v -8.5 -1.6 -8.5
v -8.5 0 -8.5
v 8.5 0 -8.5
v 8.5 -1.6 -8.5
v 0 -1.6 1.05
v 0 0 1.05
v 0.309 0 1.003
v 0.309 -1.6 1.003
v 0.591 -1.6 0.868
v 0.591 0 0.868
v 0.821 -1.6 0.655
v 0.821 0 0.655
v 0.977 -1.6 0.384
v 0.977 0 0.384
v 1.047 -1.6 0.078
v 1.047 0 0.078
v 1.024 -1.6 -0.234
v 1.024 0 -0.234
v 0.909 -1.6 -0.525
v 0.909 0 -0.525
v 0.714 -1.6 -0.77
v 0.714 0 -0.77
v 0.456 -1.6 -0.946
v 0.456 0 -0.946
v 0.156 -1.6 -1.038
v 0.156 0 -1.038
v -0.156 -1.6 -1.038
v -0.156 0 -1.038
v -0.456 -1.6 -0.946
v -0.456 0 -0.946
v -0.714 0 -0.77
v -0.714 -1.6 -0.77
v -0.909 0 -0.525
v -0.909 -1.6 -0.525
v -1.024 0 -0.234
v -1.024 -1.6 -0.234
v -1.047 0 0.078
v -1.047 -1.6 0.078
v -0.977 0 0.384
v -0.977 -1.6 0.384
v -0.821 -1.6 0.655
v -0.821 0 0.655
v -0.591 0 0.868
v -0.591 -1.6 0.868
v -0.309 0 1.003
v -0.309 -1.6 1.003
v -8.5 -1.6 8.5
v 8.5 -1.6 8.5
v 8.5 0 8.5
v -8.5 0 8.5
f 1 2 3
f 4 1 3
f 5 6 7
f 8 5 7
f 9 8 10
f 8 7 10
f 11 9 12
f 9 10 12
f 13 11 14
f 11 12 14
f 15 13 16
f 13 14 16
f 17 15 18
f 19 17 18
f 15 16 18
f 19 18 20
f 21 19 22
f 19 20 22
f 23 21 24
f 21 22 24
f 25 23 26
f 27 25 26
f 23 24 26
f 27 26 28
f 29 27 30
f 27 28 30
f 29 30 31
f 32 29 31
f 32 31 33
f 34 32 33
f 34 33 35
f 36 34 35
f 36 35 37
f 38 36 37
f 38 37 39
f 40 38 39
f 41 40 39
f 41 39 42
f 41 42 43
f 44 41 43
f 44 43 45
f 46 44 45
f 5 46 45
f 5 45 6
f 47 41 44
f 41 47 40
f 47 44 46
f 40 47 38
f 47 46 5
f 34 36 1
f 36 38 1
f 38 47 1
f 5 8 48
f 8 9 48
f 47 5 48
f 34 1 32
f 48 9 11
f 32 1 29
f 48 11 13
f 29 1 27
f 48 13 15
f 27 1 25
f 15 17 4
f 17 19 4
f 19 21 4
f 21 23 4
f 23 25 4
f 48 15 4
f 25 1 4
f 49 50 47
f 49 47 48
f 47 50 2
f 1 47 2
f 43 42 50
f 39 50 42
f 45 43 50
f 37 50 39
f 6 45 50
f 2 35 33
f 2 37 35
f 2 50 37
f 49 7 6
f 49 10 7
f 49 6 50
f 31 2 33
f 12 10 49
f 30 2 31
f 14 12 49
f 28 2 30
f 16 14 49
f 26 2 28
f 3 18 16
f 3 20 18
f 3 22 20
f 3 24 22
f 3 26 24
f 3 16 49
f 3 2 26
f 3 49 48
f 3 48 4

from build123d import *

# Parameters (mm, degrees)
SKETCH_7_W          = 17
SKETCH_7_H          = 17
EXTRUDE_5_DEPTH     = 1.6
SKETCH_12_R         = 1.05
CUT_EXTRUDE_3_DEPTH = 13.126829759


with BuildPart() as part:
    # 草图7 → 凸台-拉伸5 (new body)
    with BuildSketch(Plane(origin=(0, 0, 0), x_dir=(1, 0, 0), z_dir=(0, 1, 0))):
        Rectangle(SKETCH_7_W, SKETCH_7_H)
    extrude(amount=-EXTRUDE_5_DEPTH)

    # 草图12 → 切除-拉伸3 (cut, through all)
    with BuildSketch(Plane(origin=(0, 0, 0), x_dir=(1, 0, 0), z_dir=(0, 1, 0))):
        with Locations(Location((0, 0, 0), (0, 0, 270))):
            Circle(SKETCH_12_R)
    extrude(amount=-CUT_EXTRUDE_3_DEPTH, mode=Mode.SUBTRACT)


solid = part.part
